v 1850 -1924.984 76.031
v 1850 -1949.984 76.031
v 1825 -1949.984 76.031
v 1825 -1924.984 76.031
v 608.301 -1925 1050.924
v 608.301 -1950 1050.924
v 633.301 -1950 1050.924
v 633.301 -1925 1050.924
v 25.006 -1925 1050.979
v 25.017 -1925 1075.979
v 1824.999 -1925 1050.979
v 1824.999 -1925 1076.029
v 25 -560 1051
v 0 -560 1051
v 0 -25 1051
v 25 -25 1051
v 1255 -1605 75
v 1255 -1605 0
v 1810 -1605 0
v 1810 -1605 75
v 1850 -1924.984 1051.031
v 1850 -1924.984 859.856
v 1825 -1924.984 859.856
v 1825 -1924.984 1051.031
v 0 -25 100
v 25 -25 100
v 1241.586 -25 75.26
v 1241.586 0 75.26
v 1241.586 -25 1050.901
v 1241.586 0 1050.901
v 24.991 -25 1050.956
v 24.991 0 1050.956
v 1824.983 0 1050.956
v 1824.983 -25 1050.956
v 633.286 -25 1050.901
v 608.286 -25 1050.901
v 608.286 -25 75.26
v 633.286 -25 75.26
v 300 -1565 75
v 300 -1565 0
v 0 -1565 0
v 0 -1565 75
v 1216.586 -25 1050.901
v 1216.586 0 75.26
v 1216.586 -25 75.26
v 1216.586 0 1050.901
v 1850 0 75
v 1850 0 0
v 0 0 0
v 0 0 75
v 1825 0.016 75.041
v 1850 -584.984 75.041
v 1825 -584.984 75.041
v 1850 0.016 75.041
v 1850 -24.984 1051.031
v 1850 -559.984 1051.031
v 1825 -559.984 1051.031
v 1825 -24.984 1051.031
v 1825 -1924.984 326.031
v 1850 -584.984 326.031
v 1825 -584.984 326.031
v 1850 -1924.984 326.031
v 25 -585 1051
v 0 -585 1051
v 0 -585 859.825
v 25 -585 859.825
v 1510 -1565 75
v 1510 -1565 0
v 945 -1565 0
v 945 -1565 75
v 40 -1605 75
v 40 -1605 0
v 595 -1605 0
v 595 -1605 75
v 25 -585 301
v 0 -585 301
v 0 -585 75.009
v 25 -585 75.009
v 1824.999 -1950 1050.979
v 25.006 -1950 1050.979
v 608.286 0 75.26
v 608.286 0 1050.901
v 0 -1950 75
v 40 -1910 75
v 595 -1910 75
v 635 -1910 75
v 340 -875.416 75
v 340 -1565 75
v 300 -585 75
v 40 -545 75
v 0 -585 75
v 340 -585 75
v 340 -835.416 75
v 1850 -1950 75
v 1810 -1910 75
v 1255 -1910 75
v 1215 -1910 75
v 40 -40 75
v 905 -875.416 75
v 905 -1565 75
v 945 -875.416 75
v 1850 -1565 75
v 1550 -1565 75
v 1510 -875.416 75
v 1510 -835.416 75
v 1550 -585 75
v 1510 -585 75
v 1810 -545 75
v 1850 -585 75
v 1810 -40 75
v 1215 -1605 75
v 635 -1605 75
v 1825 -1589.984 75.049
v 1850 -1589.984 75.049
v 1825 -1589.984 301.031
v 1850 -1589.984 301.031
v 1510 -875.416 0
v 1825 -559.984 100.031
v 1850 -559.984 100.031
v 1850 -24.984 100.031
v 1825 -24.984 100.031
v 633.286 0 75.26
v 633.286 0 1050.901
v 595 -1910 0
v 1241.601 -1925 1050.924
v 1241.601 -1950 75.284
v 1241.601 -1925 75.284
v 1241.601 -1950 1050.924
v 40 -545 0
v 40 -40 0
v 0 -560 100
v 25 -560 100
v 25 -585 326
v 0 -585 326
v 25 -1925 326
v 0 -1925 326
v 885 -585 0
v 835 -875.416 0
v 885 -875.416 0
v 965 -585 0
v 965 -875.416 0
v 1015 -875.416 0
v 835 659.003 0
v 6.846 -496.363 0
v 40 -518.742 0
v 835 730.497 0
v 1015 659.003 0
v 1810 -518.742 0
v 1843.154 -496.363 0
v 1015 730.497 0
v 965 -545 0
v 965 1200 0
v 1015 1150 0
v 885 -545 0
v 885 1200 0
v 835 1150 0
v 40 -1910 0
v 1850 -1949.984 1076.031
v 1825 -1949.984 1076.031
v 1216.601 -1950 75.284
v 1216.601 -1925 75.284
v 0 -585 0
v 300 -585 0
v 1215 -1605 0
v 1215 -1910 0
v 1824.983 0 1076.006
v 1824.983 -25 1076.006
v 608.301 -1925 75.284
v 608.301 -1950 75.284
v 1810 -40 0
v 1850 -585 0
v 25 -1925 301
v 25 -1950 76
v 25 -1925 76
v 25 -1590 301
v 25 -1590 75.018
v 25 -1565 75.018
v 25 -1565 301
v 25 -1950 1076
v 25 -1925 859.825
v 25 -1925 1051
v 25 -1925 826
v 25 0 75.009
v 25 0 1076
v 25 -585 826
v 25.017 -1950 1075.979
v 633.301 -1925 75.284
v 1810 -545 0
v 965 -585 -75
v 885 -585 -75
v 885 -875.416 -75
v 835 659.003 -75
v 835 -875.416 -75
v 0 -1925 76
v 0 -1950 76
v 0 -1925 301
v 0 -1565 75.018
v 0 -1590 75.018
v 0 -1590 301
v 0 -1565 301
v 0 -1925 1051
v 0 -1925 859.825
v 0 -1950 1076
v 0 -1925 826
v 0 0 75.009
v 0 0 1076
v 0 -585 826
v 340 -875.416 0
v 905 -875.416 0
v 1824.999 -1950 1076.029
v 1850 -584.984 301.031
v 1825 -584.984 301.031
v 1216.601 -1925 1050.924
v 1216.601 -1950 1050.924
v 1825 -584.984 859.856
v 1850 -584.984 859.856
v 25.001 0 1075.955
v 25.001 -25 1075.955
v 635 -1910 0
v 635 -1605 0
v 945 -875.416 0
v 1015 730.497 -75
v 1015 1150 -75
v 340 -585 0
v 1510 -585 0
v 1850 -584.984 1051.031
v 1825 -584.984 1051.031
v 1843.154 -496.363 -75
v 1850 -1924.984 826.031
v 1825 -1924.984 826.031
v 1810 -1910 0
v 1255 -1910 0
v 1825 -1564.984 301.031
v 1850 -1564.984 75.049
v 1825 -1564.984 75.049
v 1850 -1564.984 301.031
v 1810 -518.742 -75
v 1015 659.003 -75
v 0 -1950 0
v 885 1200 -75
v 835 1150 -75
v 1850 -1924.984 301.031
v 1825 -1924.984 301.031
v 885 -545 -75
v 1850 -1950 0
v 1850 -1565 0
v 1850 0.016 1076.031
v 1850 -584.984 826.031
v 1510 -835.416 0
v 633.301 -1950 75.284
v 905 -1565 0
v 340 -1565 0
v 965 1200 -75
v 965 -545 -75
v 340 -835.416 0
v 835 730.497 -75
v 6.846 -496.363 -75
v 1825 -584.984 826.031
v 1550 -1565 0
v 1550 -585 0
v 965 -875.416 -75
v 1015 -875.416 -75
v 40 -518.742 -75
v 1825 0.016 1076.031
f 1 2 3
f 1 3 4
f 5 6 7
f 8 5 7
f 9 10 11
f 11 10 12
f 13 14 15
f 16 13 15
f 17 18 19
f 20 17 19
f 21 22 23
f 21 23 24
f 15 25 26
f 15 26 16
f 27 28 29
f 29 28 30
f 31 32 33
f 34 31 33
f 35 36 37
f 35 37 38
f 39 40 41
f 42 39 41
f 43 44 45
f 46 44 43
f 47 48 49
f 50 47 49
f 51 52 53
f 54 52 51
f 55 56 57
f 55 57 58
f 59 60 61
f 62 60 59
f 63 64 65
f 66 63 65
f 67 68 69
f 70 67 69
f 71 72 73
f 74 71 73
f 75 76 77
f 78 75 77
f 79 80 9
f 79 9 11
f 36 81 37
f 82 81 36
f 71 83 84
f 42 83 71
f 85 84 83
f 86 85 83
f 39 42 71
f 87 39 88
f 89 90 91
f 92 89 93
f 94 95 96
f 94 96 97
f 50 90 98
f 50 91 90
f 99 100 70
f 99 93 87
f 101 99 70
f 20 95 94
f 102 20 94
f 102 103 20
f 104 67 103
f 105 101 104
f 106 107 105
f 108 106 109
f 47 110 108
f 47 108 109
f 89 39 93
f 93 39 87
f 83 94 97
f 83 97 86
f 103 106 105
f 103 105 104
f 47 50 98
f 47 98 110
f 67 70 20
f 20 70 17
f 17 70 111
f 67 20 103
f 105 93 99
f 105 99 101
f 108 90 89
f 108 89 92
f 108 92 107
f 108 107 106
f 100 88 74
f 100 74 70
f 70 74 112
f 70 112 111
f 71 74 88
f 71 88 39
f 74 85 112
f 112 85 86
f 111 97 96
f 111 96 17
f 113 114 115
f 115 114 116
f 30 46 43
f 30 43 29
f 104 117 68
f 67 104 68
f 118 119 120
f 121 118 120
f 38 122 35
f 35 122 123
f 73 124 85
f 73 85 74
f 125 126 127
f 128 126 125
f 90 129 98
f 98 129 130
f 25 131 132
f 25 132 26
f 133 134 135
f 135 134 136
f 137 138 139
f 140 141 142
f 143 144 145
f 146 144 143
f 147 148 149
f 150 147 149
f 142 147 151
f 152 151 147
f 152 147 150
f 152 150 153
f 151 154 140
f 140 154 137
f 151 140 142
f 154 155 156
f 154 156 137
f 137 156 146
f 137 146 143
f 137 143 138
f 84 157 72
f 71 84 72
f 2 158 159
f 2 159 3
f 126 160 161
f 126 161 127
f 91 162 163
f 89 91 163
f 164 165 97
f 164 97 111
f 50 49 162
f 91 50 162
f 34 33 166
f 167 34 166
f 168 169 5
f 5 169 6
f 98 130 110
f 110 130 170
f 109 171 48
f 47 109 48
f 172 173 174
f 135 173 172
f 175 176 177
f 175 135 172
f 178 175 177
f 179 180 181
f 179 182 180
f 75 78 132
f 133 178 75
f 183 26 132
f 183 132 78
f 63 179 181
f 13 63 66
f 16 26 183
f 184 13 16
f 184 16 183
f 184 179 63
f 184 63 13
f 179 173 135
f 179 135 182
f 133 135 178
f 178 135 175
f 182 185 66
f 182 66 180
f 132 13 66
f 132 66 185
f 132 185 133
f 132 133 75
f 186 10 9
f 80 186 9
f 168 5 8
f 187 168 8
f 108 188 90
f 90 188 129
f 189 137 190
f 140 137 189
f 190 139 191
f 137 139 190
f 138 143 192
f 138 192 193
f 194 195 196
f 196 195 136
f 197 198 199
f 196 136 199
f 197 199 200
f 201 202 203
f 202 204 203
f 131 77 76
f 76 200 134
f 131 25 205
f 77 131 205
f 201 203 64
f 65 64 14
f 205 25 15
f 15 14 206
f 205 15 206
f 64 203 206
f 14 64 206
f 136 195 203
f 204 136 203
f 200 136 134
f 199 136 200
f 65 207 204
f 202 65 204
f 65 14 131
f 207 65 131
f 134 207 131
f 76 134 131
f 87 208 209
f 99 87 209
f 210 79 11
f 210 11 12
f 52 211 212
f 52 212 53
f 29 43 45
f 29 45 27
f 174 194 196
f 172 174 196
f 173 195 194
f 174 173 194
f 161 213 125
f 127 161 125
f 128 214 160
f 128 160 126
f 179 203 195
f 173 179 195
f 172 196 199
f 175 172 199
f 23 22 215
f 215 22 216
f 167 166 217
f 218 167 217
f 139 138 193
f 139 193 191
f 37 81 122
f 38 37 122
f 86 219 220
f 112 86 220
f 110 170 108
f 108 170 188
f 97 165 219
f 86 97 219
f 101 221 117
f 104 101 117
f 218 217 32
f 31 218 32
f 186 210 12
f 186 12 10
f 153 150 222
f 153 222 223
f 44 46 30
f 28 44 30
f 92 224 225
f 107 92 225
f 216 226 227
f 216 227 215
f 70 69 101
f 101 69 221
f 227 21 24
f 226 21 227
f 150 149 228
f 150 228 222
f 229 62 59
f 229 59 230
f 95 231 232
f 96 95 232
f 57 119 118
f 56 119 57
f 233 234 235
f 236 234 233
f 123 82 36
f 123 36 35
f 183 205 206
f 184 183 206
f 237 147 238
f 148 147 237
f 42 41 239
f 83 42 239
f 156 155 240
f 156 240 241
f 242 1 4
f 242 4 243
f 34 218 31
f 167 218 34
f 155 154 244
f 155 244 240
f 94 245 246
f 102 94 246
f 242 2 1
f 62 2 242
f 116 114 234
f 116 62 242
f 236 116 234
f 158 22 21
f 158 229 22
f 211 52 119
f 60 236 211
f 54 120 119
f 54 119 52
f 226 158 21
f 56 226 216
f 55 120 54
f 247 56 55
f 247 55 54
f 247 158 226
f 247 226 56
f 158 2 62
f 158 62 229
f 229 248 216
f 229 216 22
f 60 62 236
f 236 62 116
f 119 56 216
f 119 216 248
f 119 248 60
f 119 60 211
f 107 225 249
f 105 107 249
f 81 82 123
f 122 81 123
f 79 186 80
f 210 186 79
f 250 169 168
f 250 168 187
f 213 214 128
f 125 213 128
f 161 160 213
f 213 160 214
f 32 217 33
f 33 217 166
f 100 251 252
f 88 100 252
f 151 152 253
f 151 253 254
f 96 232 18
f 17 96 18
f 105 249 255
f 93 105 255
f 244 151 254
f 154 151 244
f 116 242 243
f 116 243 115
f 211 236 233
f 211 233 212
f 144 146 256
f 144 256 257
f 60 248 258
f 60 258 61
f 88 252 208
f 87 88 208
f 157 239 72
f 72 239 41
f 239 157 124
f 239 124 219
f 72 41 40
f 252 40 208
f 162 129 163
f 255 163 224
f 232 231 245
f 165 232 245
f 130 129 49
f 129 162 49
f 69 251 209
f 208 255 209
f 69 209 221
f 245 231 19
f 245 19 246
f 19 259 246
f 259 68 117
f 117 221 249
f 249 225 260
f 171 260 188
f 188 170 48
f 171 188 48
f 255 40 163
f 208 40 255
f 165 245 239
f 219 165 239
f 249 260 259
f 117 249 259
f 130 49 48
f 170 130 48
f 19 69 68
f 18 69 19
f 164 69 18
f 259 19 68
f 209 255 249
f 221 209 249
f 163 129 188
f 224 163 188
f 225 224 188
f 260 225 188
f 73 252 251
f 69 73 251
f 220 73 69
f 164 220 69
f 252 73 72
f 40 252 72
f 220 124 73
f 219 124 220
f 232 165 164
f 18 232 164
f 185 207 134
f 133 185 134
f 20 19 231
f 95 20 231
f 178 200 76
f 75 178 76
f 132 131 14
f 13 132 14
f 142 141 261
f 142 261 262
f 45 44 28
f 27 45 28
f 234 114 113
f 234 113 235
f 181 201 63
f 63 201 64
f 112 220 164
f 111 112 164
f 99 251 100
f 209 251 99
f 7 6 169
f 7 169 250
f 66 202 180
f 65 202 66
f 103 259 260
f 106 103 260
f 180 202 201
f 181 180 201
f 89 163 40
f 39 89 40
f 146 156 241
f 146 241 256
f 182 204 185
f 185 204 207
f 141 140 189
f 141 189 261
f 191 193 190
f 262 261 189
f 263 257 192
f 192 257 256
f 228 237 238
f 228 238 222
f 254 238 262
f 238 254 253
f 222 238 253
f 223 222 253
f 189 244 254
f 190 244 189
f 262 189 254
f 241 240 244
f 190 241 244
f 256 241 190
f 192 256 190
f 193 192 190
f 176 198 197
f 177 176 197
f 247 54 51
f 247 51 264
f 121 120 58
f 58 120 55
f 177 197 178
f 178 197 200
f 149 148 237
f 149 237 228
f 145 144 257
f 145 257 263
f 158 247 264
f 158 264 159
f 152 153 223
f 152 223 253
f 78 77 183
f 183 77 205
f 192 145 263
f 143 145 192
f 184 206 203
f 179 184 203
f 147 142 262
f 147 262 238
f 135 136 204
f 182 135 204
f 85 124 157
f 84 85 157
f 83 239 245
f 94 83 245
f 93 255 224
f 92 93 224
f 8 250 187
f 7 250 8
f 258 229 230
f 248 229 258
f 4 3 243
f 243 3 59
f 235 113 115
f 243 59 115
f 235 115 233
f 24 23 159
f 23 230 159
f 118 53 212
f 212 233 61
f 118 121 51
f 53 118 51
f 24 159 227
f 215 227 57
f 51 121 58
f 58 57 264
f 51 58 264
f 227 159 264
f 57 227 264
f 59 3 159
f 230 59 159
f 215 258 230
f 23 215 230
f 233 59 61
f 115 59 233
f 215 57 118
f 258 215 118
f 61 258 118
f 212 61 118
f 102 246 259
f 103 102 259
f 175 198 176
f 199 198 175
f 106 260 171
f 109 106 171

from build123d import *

# Parameters (mm, degrees)
F0_W      = 50
F0_H      = 40
F0_W_2    = 80
F0_W_3    = 495
F0_W_4    = 40
F0_H_2    = 689.5836830139
F0_H_3    = 305
F1_DEPTH  = 75
F0_H_4    = 250.4163169861
F0_H_5    = 505
F2_DEPTH  = 75
F3_W      = 535
F3_H      = 951
F3_W_2    = 25
F3_H_2    = 225.9821975827
F3_W_3    = 1340
F3_H_3    = 33.8248362541
F4_DEPTH  = 25
F7_W      = 1340
F7_H      = 33.8248362541
F7_W_2    = 535
F7_H_2    = 951
F7_W_3    = 25
F7_H_3    = 225.9821975827
F8_DEPTH  = 25
F9_W      = 25
F9_H      = 975.6403267384
F10_DEPTH = 25
F12_DEPTH = 25
F11_W     = 25
F11_H     = 975.6403267384


# Not quite as in the source:
# - a feature names something its author has since deleted; it is built from what else it names


with BuildPart() as f1:
    # F0 (on Top) → F1 (new body)
    with BuildSketch(Plane.XY):
        Polygon((341.9006320566, 0), (0, 0), (0, -585), (300, -585), (340, -585), (835, -585), (835, -545), (40, -545), (40, -518.7423229218), (6.8463404132, -496.362982985), (40, -447.2478103703), (40, -40), (314.8998843676, -40), align=None)
        Polygon((390.1607644204, 0), (341.9006320566, 0), (314.8998843676, -40), (363.1600167314, -40), align=None)
        Polygon((835, 0), (390.1607644204, 0), (363.1600167314, -40), (835, -40), align=None)
        Polygon((340, -585), (300, -585), (300, -1565), (340, -1565), (340, -875.4163169861), (340, -835.4163169861), align=None)
        with Locations((860, -20)):
            Rectangle(F0_W, F0_H)
        Polygon((40, -518.7423229218), (40, -447.2478103703), (6.8463404132, -496.362982985), align=None)
        Polygon((340, -1565), (300, -1565), (0, -1565), (0, -1950), (1850, -1950), (1850, -1565), (1550, -1565), (1510, -1565), (945, -1565), (905, -1565), align=None)
        Polygon((1255, -1605), (1810, -1605), (1810, -1910), (1255, -1910), (1215, -1910), (635, -1910), (595, -1910), (40, -1910), (40, -1605), (595, -1605), (635, -1605), (1215, -1605), align=None, mode=Mode.SUBTRACT)
        with Locations((925, -20)):
            Rectangle(F0_W_2, F0_H)
        with Locations((860, -565)):
            Rectangle(F0_W, F0_H)
        with Locations((587.5, -855.4163169861)):
            Rectangle(F0_W_3, F0_H)
        with Locations((990, -20)):
            Rectangle(F0_W, F0_H)
        with Locations((925, -565)):
            Rectangle(F0_W_2, F0_H)
        with Locations((860, -855.4163169861)):
            Rectangle(F0_W, F0_H)
        with Locations((925, -1220.208158493)):
            Rectangle(F0_W_4, F0_H_2)
        Polygon((1459.8392355796, 0), (1015, 0), (1015, -40), (1486.8399832686, -40), align=None)
        with Locations((990, -565)):
            Rectangle(F0_W, F0_H)
        Polygon((965, -835.4163169861), (885, -835.4163169861), (885, -875.4163169861), (905, -875.4163169861), (945, -875.4163169861), (965, -875.4163169861), align=None)
        Polygon((1508.0993679434, 0), (1459.8392355796, 0), (1486.8399832686, -40), (1535.1001156324, -40), align=None)
        Polygon((1015, -545), (1015, -585), (1510, -585), (1550, -585), (1850, -585), (1850, 0), (1508.0993679434, 0), (1535.1001156324, -40), (1810, -40), (1810, -447.2478103703), (1843.1536595868, -496.362982985), (1810, -518.7423229218), (1810, -545), align=None)
        with Locations((990, -855.4163169861)):
            Rectangle(F0_W, F0_H)
        Polygon((1510, -875.4163169861), (1510, -1565), (1550, -1565), (1550, -585), (1510, -585), (1510, -835.4163169861), align=None)
        with Locations((1262.5, -855.4163169861)):
            Rectangle(F0_W_3, F0_H)
        Polygon((1810, -447.2478103703), (1810, -518.7423229218), (1843.1536595868, -496.362982985), align=None)
        with Locations((1235, -1757.5)):
            Rectangle(F0_W_4, F0_H_3)
        with Locations((615, -1757.5)):
            Rectangle(F0_W_4, F0_H_3)
    extrude(amount=F1_DEPTH)


with BuildPart() as f2:
    # F0 (on Top) → F2 (new body)
    with BuildSketch(Plane.XY):
        with Locations((990, -710.208158493)):
            Rectangle(F0_W, F0_H_4)
        Polygon((835, 730.4973530704), (341.9006320566, 0), (390.1607644204, 0), (835, 659.0028405189), align=None)
        Polygon((363.1600167314, -40), (314.8998843676, -40), (40, -447.2478103703), (40, -518.7423229218), align=None)
        Polygon((390.1607644204, 0), (341.9006320566, 0), (314.8998843676, -40), (363.1600167314, -40), align=None)
        with Locations((990, -292.5)):
            Rectangle(F0_W, F0_H_5)
        Polygon((1535.1001156324, -40), (1486.8399832686, -40), (1810, -518.7423229218), (1810, -447.2478103703), align=None)
        Polygon((1015, 659.0028405189), (1459.8392355796, 0), (1508.0993679434, 0), (1015, 730.4973530704), align=None)
        Polygon((1508.0993679434, 0), (1459.8392355796, 0), (1486.8399832686, -40), (1535.1001156324, -40), align=None)
        with Locations((990, -20)):
            Rectangle(F0_W, F0_H)
        with Locations((860, -20)):
            Rectangle(F0_W, F0_H)
        with Locations((860, -565)):
            Rectangle(F0_W, F0_H)
        with Locations((925, -565)):
            Rectangle(F0_W_2, F0_H)
        with Locations((990, -565)):
            Rectangle(F0_W, F0_H)
        with Locations((860, -855.4163169861)):
            Rectangle(F0_W, F0_H)
        with Locations((990, -855.4163169861)):
            Rectangle(F0_W, F0_H)
        Polygon((40, -518.7423229218), (40, -447.2478103703), (6.8463404132, -496.362982985), align=None)
        Polygon((1810, -447.2478103703), (1810, -518.7423229218), (1843.1536595868, -496.362982985), align=None)
        with Locations((860, -292.5)):
            Rectangle(F0_W, F0_H_5)
        with Locations((860, -710.208158493)):
            Rectangle(F0_W, F0_H_4)
        Polygon((835, 1150), (835, 730.4973530704), (835, 659.0028405189), (835, 0), (885, 0), (885, 1200), align=None)
        Polygon((965, 1200), (965, 0), (1015, 0), (1015, 659.0028405189), (1015, 730.4973530704), (1015, 1150), align=None)
    extrude(amount=-F2_DEPTH)


with BuildPart() as f4:
    # F3 (on Right) → F4 (new body)
    with BuildSketch(Plane.YZ):
        Polygon((0, 75.0093311071), (0, 1076), (-1950, 1076), (-1950, 76), (-1925, 76), (-1925, 301), (-1925, 326), (-1925, 826), (-1925, 859.8248362541), (-1925, 1051), (-585, 1051), (-585, 859.8248362541), (-585, 826), (-585, 326), (-585, 301), (-585, 75.0093311071), align=None)
        with Locations((-292.5, 575.5)):
            Rectangle(F3_W, F3_H, mode=Mode.SUBTRACT)
        Polygon((-1565, 301), (-585, 301), (-585, 326), (-1925, 326), (-1925, 301), (-1590, 301), align=None)
        with Locations((-1577.5, 188.0089012086)):
            Rectangle(F3_W_2, F3_H_2)
        with Locations((-1255, 842.9124181271)):
            Rectangle(F3_W_3, F3_H_3)
    extrude(amount=F4_DEPTH)


with BuildPart() as f8:
    # F7 (on offset) → F8 (new body)
    with BuildSketch(Plane.YZ.offset(1850)):
        with Locations((-1254.9842073394, 842.9438270557)):
            Rectangle(F7_W, F7_H)
        Polygon((0.0157926606, 75.0407400358), (0.0157926606, 1076.0314089287), (-1949.9842073394, 1076.0314089287), (-1949.9842073394, 76.0314089287), (-1924.9842073394, 76.0314089287), (-1924.9842073394, 301.0314089287), (-1924.9842073394, 326.0314089287), (-1924.9842073394, 826.0314089287), (-1924.9842073394, 859.8562451828), (-1924.9842073394, 1051.0314089287), (-584.9842073394, 1051.0314089287), (-584.9842073394, 859.8562451828), (-584.9842073394, 826.0314089287), (-584.9842073394, 326.0314089287), (-584.9842073394, 301.0314089287), (-584.9842073394, 75.0407400358), align=None)
        with Locations((-292.4842073394, 575.5314089287)):
            Rectangle(F7_W_2, F7_H_2, mode=Mode.SUBTRACT)
        Polygon((-1564.9842073394, 301.0314089287), (-584.9842073394, 301.0314089287), (-584.9842073394, 326.0314089287), (-1924.9842073394, 326.0314089287), (-1924.9842073394, 301.0314089287), (-1589.9842073394, 301.0314089287), align=None)
        with Locations((-1577.4842073394, 188.0403101373)):
            Rectangle(F7_W_3, F7_H_3)
    extrude(amount=-F8_DEPTH)


with BuildPart() as f10:
    # F9 (on Front) → F10 (new body)
    with BuildSketch(Plane.XZ):
        with Locations((1229.0860442189, 563.0803654591)):
            Rectangle(F9_W, F9_H)
    extrude(amount=F10_DEPTH)


with BuildPart() as f10b:
    # F9 (on Front) → F10, piece 2 (new body)
    with BuildSketch(Plane.XZ):
        with Locations((620.7860442189, 563.0803654591)):
            Rectangle(F9_W, F9_H)
    extrude(amount=F10_DEPTH)


with BuildPart() as f10c:
    # F9 (on Front) → F10, piece 3 (new body)
    with BuildSketch(Plane.XZ):
        Polygon((25.0013015178, 1075.9552220504), (24.9906565008, 1050.9557227294), (1824.9834692982, 1050.9557227294), (1824.9834692982, 1076.006124417), align=None)
    extrude(amount=F10_DEPTH)


with BuildPart() as f12:
    # F11 (on offset) → F12 (new body)
    with BuildSketch(Plane.XZ.offset(1950)):
        Polygon((25.0165007023, 1075.9785572688), (25.0058556852, 1050.9790579478), (1824.9986684827, 1050.9790579478), (1824.9986684827, 1076.0294596354), align=None)
    extrude(amount=-F12_DEPTH)


with BuildPart() as f12b:
    # F11 (on offset) → F12, piece 2 (new body)
    with BuildSketch(Plane.XZ.offset(1950)):
        with Locations((620.8012434033, 563.1037006776)):
            Rectangle(F11_W, F11_H)
    extrude(amount=-F12_DEPTH)


with BuildPart() as f12c:
    # F11 (on offset) → F12, piece 3 (new body)
    with BuildSketch(Plane.XZ.offset(1950)):
        with Locations((1229.1012434033, 563.1037006776)):
            Rectangle(F11_W, F11_H)
    extrude(amount=-F12_DEPTH)


solid = Compound([f1.part, f2.part, f4.part, f8.part, f10.part, f10b.part, f10c.part, f12.part, f12b.part, f12c.part])
